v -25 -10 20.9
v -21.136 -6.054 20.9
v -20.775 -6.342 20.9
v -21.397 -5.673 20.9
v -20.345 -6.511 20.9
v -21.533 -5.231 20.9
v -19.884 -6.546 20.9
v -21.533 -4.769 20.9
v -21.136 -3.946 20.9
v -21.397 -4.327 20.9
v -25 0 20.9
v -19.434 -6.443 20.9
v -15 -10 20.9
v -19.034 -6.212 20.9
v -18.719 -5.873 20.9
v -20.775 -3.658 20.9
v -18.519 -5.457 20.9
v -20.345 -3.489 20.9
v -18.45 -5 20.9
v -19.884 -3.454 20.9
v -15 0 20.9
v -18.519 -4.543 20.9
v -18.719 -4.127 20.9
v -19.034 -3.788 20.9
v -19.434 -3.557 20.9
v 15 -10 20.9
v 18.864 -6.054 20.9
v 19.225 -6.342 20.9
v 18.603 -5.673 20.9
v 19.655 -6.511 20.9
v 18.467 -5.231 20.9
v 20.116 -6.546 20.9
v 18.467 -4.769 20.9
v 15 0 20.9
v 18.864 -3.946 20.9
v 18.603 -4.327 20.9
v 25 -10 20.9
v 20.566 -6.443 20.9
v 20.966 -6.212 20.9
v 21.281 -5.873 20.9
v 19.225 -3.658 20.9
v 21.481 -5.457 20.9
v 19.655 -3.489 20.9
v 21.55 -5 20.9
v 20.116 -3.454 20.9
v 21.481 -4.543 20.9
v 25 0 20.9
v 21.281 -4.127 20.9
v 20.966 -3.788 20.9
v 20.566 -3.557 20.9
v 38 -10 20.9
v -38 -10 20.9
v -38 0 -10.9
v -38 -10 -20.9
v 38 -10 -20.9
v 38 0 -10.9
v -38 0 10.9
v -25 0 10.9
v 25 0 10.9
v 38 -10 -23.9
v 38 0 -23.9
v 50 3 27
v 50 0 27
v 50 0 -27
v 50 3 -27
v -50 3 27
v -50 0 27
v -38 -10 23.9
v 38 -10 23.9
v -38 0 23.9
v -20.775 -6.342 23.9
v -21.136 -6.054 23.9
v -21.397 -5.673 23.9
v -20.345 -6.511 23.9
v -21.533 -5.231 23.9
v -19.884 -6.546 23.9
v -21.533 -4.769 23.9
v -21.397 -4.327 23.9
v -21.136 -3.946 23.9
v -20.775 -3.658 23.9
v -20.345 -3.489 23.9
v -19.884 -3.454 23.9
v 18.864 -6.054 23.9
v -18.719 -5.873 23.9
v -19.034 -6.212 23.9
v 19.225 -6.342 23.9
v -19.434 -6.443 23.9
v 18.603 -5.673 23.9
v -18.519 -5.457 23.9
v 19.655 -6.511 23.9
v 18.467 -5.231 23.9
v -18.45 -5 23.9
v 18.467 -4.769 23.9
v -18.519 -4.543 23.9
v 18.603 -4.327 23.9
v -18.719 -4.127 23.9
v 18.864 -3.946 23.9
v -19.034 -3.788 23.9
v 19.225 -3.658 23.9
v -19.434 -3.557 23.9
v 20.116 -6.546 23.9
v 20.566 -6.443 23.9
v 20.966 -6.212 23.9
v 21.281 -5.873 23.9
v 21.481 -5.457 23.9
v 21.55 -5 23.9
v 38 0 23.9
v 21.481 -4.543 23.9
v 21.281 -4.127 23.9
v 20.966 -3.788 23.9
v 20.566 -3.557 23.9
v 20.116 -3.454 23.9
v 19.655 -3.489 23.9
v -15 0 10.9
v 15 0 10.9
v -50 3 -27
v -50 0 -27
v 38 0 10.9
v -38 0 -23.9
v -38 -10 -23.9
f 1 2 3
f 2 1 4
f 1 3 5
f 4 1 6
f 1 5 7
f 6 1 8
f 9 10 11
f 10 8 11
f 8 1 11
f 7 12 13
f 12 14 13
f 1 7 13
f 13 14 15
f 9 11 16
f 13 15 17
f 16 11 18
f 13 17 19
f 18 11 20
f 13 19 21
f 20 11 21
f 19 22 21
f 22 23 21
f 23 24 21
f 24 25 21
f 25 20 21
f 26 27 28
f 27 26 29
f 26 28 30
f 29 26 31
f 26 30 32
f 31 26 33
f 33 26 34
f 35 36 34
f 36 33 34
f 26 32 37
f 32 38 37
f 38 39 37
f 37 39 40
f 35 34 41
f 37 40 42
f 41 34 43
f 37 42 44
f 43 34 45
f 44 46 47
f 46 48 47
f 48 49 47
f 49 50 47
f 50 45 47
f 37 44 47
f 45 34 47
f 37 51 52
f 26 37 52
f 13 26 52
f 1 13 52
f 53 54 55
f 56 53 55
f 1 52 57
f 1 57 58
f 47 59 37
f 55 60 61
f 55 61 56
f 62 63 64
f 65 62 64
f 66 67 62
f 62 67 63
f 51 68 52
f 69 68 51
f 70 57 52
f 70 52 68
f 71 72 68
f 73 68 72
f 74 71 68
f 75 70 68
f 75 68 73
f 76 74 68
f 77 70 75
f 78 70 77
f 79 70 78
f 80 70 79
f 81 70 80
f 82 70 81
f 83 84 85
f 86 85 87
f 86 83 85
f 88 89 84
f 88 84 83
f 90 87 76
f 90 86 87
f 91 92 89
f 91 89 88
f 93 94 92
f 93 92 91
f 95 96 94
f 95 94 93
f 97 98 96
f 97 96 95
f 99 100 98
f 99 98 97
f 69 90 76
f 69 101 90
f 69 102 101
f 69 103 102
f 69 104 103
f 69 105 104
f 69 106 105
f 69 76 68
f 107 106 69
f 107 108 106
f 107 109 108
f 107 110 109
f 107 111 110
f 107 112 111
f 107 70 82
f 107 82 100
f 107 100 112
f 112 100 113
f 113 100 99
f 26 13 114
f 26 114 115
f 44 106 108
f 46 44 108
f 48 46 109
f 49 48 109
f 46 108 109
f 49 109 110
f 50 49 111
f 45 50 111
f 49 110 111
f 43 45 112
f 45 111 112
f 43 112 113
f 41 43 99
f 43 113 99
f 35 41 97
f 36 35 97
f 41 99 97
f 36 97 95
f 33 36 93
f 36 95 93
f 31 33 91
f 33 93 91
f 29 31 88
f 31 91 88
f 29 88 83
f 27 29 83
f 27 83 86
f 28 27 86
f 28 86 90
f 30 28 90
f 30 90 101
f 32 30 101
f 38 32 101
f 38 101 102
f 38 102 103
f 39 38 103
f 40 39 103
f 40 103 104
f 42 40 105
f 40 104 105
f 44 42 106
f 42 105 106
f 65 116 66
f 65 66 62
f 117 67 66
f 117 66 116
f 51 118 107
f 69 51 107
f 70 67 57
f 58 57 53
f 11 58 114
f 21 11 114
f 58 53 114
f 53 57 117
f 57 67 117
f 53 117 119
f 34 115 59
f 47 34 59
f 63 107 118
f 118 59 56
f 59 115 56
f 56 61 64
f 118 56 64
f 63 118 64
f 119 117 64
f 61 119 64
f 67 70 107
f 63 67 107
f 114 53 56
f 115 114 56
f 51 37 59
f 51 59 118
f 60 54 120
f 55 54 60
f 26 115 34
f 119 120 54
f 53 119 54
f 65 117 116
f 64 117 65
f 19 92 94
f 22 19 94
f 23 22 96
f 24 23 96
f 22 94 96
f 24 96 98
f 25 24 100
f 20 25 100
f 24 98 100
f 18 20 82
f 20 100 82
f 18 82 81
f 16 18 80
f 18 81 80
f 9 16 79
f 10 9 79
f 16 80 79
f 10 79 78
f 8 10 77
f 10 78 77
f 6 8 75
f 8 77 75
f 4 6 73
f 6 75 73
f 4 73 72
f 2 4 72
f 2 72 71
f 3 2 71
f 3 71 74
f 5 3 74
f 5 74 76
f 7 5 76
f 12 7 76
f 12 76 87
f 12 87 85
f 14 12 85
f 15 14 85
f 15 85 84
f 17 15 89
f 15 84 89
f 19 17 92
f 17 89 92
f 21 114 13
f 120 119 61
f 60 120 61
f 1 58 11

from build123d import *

# Parameters (mm, degrees)
SKETCH1_W           = 100
SKETCH1_H           = 54
BOSS_EXTRUDE1_DEPTH = 3
SKETCH2_W           = 76
SKETCH2_H           = 3
BOSS_EXTRUDE2_DEPTH = 10
CHAMFER1_SIZE       = 10
SKETCH3_W           = 10
SKETCH3_H           = 10
CUT_EXTRUDE1_DEPTH  = 10
SKETCH4_R           = 1.55
CUT_EXTRUDE2_DEPTH  = 3


with BuildPart() as part:
    # Sketch1 → Boss-Extrude1 (new body)
    with BuildSketch(Plane(origin=(0, 0, 0), x_dir=(1, 0, 0), z_dir=(0, 1, 0))):
        Rectangle(SKETCH1_W, SKETCH1_H)
    extrude(amount=BOSS_EXTRUDE1_DEPTH)

    # Sketch2 → Boss-Extrude2 (add)
    with BuildSketch(Plane.XZ):
        with Locations((0, 22.4)):
            Rectangle(SKETCH2_W, SKETCH2_H)
        with Locations((0, -22.4)):
            Rectangle(SKETCH2_W, SKETCH2_H)
    extrude(amount=BOSS_EXTRUDE2_DEPTH)

    # Chamfer1
    chamfer1_edges = [part.edges().sort_by_distance(p)[0] for p in [
        (0, 0, -20.9),
        (0, 0, 20.9),
    ]]
    chamfer(chamfer1_edges, length=CHAMFER1_SIZE - 0.0001)  # a hair under: the kernel refuses the full size

    # Sketch3 → Cut-Extrude1 (cut)
    with BuildSketch(Plane.XZ.offset(10)):
        with Locations((-20, 15.9)):
            Rectangle(SKETCH3_W, SKETCH3_H)
        with Locations((20, 15.9)):
            Rectangle(SKETCH3_W, SKETCH3_H)
    extrude(amount=-CUT_EXTRUDE1_DEPTH, mode=Mode.SUBTRACT)

    # Sketch4 → Cut-Extrude2 (cut)
    with BuildSketch(Plane.XY.offset(23.9)):
        with Locations((-20, -5)):
            Circle(SKETCH4_R)
        with Locations((20, -5)):
            Circle(SKETCH4_R)
    extrude(amount=-CUT_EXTRUDE2_DEPTH, mode=Mode.SUBTRACT)


solid = part.part
